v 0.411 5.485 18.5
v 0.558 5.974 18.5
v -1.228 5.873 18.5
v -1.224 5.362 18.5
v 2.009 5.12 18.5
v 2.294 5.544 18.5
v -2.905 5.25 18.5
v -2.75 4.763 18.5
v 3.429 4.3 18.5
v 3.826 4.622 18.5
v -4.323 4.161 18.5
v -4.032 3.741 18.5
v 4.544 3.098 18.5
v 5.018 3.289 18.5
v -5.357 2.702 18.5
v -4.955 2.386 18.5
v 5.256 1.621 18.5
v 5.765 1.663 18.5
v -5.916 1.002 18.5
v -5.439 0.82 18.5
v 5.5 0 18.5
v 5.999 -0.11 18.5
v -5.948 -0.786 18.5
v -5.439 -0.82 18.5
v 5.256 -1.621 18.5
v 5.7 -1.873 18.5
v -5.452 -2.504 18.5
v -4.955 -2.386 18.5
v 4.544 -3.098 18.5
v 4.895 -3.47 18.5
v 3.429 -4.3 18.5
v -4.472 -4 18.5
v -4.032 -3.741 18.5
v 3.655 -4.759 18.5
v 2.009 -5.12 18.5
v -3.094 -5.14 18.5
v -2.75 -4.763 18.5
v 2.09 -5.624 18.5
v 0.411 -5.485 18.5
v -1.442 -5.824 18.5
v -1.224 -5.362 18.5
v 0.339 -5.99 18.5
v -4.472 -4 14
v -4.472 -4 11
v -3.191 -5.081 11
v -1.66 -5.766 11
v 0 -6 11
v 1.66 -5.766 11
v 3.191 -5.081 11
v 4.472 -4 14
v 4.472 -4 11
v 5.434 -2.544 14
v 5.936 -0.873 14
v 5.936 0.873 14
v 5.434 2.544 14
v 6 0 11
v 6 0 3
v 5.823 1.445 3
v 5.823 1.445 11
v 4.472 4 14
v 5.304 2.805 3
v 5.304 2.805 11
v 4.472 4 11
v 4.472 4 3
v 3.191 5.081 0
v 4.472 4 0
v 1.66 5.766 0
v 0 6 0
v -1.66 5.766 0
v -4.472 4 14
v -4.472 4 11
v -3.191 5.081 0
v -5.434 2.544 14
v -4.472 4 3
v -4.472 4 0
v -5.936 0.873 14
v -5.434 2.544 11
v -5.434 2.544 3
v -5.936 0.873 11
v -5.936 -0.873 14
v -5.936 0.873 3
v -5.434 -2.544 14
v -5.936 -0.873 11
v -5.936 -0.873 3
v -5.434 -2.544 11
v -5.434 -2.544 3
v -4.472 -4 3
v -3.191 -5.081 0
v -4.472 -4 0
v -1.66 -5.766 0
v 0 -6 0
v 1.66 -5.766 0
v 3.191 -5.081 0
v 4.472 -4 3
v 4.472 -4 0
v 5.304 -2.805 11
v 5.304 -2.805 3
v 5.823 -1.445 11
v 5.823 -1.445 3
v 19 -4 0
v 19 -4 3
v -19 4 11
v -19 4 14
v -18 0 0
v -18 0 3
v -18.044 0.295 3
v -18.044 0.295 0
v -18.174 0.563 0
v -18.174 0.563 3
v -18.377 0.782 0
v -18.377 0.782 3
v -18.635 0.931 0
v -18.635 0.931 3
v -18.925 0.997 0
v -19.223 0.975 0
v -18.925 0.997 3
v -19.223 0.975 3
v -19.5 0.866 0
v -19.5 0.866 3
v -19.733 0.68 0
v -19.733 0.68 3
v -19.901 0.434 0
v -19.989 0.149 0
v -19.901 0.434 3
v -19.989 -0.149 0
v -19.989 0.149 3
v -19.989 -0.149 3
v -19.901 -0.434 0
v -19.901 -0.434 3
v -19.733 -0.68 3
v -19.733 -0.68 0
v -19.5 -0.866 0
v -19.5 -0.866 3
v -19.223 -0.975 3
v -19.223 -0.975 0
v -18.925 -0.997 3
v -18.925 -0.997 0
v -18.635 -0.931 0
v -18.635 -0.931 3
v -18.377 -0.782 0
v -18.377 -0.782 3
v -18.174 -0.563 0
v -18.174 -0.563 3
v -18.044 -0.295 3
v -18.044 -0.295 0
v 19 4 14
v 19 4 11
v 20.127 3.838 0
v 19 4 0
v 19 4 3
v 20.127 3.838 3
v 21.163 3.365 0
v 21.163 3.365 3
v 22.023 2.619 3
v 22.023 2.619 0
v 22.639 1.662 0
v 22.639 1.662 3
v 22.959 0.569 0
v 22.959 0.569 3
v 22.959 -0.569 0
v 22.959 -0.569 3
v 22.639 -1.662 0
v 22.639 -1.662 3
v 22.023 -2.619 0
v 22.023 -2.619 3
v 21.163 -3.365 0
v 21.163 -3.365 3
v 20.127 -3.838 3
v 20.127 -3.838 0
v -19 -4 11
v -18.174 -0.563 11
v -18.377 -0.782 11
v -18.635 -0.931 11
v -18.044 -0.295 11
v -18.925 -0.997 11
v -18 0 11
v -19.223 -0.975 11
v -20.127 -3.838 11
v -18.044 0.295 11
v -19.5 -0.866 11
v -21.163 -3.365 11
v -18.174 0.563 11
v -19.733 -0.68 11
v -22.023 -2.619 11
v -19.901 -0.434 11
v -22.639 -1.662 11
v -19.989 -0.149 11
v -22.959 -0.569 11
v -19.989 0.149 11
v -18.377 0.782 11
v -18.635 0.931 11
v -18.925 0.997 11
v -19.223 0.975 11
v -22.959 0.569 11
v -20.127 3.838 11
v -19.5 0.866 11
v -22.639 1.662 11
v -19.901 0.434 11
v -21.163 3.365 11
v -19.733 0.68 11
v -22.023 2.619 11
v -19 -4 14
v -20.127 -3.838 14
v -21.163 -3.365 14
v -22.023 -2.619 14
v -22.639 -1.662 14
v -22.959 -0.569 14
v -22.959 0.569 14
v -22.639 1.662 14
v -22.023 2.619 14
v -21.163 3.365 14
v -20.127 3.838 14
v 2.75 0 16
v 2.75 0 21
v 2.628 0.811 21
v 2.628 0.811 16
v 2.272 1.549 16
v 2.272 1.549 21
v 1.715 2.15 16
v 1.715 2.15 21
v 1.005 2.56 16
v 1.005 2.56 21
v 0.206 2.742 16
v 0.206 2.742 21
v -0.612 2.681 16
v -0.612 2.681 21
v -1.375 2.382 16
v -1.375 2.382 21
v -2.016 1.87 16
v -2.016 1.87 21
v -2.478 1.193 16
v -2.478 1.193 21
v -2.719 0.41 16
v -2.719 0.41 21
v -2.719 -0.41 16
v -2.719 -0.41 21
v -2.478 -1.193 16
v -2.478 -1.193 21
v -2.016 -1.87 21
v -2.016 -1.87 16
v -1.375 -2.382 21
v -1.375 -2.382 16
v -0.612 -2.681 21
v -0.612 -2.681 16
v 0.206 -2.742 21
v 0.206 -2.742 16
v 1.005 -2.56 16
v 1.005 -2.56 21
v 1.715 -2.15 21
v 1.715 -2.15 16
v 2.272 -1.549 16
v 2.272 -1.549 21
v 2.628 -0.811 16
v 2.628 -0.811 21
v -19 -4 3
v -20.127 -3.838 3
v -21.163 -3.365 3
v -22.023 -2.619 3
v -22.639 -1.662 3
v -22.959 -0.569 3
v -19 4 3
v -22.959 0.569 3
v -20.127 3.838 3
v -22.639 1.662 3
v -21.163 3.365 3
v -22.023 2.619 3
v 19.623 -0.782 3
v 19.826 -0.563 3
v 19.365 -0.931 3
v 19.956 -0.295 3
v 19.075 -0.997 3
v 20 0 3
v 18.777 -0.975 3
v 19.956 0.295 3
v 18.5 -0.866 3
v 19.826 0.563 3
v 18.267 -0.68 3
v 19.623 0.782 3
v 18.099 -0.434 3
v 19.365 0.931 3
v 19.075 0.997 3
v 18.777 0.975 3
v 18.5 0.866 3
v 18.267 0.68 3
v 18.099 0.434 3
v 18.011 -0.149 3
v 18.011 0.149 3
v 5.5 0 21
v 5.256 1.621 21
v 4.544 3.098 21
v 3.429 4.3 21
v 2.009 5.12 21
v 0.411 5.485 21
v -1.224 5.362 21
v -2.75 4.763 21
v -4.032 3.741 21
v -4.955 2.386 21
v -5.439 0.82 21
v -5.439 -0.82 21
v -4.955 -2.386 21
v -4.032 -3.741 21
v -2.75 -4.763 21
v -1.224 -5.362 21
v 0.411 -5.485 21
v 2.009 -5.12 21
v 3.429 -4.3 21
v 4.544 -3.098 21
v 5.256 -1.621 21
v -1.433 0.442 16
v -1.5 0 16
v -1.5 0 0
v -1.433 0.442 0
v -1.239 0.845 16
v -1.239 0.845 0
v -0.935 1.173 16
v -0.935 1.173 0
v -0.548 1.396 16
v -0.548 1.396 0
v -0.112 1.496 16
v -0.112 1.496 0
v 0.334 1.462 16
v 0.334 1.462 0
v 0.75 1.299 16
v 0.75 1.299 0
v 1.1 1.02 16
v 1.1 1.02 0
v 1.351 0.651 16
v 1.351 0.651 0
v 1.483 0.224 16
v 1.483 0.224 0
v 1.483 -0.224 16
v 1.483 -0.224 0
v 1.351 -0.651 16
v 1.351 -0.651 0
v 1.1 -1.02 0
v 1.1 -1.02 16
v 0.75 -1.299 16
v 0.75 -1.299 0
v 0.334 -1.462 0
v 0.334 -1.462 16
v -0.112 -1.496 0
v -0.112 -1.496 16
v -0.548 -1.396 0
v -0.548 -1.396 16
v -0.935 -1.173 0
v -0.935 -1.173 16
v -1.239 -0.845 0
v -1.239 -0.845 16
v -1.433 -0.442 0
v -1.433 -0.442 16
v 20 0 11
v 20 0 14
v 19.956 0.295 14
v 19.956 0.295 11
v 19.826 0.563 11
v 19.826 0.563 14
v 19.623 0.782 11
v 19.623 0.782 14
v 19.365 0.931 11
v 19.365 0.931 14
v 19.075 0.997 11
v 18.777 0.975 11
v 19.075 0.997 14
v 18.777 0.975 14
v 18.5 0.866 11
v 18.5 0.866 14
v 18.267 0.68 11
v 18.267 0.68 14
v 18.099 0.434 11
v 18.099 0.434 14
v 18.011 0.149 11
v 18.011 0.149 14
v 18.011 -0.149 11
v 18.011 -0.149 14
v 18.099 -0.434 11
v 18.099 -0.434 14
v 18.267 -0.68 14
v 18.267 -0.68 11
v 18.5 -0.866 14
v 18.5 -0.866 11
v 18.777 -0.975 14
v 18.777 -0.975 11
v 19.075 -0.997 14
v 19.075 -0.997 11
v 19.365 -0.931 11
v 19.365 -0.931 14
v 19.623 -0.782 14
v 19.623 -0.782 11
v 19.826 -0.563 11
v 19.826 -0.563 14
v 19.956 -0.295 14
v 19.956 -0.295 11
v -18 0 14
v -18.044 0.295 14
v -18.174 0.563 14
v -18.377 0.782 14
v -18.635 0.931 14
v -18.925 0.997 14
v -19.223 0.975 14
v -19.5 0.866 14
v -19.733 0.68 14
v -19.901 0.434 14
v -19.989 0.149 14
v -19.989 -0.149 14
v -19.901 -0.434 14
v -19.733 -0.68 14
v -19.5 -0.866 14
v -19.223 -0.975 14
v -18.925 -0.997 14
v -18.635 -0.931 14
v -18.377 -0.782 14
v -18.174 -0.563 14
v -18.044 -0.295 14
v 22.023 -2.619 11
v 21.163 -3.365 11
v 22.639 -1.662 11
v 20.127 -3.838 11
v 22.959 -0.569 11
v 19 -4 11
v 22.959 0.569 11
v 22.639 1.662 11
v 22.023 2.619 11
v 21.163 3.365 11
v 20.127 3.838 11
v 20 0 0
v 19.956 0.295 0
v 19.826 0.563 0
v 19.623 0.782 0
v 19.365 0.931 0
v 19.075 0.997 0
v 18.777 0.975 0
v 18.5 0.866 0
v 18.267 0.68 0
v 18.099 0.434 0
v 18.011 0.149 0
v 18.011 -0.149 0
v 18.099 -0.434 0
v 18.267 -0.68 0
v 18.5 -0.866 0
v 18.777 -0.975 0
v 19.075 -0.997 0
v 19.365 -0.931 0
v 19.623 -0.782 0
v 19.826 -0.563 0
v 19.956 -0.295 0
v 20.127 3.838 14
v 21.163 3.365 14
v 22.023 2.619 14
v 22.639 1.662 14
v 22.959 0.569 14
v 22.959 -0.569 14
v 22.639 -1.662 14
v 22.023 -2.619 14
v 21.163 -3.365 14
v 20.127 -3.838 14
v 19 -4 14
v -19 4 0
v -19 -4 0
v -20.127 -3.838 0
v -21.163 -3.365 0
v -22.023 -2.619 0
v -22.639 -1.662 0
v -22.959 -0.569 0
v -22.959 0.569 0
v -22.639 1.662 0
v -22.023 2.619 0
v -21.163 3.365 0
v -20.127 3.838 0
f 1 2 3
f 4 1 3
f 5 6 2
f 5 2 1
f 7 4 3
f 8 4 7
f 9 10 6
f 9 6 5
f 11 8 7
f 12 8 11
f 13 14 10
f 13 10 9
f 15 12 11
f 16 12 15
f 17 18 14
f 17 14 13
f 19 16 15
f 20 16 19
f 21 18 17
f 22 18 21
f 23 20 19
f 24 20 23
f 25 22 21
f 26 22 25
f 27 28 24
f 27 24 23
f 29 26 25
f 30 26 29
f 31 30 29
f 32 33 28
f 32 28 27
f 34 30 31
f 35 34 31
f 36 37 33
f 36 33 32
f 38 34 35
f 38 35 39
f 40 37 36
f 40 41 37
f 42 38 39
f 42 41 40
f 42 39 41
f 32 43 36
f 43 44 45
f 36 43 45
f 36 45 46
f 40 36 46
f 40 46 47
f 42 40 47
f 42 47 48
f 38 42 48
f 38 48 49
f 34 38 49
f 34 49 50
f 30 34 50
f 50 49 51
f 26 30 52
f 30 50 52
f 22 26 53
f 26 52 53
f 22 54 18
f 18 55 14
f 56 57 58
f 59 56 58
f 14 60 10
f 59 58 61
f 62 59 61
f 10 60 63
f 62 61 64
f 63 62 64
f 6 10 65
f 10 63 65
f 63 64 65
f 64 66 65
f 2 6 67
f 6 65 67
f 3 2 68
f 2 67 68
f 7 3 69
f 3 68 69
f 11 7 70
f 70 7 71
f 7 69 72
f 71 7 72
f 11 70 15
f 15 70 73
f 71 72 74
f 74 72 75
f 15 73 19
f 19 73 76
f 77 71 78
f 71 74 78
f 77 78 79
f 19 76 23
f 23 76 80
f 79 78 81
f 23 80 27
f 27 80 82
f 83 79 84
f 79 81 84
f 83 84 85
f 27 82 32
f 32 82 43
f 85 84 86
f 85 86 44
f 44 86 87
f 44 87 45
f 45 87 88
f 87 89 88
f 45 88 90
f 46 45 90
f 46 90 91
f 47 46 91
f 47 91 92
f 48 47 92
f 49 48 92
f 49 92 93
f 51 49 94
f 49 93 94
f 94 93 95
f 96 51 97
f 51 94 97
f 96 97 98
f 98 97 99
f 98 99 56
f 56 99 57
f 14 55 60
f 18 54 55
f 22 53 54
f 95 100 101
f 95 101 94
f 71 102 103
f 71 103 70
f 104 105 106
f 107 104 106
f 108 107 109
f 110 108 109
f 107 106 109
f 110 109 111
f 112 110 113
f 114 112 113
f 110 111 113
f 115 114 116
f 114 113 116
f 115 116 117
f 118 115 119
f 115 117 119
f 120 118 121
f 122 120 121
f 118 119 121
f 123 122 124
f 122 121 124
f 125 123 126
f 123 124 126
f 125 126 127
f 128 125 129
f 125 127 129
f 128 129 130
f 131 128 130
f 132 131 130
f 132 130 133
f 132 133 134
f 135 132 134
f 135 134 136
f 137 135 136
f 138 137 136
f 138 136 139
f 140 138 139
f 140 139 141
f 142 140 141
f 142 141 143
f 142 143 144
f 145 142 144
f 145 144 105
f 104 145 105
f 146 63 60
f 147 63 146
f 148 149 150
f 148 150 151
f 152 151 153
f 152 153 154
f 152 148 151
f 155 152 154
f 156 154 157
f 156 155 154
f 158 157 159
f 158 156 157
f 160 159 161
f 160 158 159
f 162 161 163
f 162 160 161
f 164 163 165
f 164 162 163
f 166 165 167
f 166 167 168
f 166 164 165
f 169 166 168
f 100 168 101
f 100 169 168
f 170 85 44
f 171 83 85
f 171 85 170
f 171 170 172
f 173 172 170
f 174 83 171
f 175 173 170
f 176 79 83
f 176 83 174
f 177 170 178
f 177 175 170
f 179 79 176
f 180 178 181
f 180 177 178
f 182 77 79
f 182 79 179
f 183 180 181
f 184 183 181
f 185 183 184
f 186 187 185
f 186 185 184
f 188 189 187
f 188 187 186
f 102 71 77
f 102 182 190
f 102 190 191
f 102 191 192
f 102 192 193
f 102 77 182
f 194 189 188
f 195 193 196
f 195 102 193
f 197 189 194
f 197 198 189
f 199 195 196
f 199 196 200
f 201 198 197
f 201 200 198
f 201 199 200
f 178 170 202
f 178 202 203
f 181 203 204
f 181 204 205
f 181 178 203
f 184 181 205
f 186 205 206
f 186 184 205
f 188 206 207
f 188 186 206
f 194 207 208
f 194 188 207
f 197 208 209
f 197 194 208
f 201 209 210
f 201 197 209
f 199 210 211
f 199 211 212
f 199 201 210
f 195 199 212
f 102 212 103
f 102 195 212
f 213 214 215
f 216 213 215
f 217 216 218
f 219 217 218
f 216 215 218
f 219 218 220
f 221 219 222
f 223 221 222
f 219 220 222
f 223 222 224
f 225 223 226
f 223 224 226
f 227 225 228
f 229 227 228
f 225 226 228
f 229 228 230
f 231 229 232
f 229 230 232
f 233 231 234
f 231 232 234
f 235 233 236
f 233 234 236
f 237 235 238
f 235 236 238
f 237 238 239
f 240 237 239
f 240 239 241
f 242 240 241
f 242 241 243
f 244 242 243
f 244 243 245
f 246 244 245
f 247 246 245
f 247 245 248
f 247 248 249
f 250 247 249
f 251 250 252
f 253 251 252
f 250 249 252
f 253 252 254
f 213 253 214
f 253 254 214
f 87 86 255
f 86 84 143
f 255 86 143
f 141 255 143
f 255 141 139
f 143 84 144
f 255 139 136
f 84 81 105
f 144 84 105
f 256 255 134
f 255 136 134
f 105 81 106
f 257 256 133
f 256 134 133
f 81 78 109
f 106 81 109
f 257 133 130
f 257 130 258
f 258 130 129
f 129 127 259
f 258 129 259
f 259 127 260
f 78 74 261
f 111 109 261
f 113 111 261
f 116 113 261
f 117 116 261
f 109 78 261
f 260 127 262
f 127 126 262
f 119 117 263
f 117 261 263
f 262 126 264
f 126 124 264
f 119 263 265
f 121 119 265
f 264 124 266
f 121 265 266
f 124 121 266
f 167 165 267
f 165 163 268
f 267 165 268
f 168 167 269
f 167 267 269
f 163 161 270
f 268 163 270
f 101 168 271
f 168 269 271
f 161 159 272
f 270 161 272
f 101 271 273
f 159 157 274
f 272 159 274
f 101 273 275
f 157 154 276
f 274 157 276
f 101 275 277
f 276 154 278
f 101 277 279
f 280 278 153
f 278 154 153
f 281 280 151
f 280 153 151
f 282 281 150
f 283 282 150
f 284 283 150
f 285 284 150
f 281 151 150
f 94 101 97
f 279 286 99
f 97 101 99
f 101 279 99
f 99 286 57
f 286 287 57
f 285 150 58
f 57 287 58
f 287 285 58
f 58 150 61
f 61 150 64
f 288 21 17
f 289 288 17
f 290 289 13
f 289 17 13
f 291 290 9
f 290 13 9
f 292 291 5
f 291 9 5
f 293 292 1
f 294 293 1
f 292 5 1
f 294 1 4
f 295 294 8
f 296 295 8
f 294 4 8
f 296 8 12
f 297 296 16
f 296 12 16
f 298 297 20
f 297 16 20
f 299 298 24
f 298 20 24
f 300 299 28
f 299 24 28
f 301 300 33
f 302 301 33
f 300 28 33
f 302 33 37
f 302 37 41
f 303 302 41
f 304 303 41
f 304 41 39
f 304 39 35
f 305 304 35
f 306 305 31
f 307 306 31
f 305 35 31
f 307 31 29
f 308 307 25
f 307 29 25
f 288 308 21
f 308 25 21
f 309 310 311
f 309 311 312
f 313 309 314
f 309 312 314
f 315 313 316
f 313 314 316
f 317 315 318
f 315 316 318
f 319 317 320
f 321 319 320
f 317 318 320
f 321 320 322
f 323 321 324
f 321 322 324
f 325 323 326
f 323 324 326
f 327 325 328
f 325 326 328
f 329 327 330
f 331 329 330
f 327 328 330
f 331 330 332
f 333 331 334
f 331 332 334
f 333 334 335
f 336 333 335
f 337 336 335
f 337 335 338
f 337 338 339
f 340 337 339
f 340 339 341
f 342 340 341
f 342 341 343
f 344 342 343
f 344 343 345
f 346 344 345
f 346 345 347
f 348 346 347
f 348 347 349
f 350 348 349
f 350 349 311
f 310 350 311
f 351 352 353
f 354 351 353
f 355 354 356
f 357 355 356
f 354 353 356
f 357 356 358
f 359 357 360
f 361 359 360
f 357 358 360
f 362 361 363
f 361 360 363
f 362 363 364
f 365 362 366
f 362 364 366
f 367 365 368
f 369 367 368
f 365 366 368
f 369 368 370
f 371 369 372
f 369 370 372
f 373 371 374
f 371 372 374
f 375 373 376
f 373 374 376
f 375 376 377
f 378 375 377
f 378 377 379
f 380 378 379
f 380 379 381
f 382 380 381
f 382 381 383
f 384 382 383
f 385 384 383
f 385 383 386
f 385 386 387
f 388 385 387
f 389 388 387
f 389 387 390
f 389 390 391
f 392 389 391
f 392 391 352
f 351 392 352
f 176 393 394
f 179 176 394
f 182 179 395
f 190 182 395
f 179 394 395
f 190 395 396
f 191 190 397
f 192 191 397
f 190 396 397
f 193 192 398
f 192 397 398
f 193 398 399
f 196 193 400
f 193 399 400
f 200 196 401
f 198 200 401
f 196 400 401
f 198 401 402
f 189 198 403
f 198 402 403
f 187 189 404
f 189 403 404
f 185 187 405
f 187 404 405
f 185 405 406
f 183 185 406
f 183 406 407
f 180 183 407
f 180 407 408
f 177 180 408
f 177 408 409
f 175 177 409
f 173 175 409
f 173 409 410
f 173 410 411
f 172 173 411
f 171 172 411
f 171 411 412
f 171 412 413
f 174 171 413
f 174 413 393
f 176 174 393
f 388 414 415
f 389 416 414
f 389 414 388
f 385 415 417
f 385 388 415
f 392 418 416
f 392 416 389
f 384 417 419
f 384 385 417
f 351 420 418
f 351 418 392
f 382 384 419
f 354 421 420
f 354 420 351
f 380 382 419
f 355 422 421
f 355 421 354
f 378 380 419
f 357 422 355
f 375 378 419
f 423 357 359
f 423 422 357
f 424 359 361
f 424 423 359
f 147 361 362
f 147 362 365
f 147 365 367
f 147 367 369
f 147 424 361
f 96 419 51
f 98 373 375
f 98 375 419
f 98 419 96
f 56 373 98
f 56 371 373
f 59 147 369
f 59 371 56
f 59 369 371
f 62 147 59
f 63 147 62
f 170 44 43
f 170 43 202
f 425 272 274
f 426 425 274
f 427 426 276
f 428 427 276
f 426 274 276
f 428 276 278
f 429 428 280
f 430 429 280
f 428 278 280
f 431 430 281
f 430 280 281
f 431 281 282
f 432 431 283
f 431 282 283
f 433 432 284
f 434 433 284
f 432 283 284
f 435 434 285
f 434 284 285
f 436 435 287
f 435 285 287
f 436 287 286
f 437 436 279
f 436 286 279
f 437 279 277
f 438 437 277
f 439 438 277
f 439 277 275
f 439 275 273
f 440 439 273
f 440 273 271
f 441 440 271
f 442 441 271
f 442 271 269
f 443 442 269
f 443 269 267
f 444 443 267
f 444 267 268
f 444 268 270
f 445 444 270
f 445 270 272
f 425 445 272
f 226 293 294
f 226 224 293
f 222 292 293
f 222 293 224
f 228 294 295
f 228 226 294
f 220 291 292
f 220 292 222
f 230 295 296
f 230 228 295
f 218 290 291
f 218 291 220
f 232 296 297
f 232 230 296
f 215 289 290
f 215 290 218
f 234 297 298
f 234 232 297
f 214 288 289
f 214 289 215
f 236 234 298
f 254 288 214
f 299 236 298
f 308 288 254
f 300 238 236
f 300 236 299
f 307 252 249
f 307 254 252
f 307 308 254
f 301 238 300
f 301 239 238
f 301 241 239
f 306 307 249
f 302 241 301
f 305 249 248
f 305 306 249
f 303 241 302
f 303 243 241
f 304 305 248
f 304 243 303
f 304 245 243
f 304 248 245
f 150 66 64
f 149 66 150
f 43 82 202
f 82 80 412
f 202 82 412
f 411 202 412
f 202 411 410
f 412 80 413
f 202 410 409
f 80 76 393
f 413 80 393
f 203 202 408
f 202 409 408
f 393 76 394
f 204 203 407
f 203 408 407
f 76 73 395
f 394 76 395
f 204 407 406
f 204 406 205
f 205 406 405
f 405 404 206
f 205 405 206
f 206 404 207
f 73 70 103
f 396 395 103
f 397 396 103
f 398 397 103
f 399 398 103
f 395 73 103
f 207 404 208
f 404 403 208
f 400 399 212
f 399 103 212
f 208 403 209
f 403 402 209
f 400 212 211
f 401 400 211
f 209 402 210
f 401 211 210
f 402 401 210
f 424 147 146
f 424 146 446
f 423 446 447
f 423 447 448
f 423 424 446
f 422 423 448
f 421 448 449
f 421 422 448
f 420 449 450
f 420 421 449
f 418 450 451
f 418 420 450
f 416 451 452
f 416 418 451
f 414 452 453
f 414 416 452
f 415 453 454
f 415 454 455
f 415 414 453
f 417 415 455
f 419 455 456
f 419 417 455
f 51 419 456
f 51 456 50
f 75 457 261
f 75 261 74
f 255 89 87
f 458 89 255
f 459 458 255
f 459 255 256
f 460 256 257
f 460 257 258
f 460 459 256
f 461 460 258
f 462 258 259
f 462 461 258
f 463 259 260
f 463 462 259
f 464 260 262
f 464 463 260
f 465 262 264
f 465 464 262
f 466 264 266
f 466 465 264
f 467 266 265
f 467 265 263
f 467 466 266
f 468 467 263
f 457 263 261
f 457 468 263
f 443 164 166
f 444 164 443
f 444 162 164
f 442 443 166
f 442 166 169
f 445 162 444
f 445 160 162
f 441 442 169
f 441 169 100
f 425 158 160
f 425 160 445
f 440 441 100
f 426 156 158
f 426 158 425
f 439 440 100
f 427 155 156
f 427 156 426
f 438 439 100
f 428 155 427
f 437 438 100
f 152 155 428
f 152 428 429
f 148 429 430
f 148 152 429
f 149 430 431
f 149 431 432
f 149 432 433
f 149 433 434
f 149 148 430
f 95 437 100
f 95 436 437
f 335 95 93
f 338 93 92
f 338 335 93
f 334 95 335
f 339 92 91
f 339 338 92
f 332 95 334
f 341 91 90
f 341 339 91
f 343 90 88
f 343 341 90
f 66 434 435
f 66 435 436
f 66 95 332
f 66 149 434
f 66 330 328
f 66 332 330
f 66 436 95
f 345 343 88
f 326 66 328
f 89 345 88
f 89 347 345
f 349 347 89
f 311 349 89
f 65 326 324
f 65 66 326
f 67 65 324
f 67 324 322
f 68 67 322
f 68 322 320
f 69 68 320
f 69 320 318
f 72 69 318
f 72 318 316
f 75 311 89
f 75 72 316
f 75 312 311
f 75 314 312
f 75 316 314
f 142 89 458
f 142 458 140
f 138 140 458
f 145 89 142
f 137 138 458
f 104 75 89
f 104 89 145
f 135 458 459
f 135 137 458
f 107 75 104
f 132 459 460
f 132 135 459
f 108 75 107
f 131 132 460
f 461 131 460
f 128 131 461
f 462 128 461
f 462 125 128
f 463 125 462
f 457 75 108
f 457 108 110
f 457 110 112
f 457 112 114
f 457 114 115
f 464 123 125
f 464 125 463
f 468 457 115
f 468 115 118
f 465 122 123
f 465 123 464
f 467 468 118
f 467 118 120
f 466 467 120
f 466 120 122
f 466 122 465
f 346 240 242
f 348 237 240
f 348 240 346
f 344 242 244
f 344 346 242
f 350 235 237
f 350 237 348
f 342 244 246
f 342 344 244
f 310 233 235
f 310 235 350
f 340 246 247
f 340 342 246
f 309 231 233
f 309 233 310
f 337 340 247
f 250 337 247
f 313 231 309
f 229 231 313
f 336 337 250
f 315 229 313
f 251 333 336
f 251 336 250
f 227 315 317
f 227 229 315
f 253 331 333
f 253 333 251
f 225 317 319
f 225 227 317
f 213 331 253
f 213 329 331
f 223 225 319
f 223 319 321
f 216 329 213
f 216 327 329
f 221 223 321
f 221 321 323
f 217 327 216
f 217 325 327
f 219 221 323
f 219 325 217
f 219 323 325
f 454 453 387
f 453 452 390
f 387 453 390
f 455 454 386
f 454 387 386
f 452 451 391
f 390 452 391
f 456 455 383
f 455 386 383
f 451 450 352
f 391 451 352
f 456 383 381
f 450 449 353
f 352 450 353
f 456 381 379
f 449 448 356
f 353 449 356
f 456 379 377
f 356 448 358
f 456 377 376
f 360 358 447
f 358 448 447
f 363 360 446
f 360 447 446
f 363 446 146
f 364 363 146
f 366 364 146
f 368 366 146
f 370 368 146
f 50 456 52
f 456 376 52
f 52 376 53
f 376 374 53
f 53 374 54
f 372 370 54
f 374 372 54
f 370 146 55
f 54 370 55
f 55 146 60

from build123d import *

# Parameters (mm, degrees)
SKETCH_1_R          = 6
EXTRUDE_1_DEPTH     = 11
EXTRUDE_2_DEPTH     = 3
EXTRUDE_3_DEPTH     = 3
SKETCH_5_R          = 6
EXTRUDE_4_DEPTH     = 10
SKETCH_6_R          = 1.5
CUT_EXTRUDE_1_DEPTH = 32.717503054
CUT_EXTRUDE_START   = -2.5
SKETCH_7_R          = 6
SKETCH_7_R_2        = 5.5
CUT_EXTRUDE_2_DEPTH = 2.5
SKETCH_8_R          = 1
CUT_EXTRUDE_3_DEPTH = 28.586228448
SKETCH_9_R          = 2.75
CUT_EXTRUDE_4_DEPTH = 5


with BuildPart() as part:
    # 草图1 → 凸台-拉伸1 (new body)
    with BuildSketch(Plane.XY):
        Circle(SKETCH_1_R)
    extrude(amount=EXTRUDE_1_DEPTH)

    # 草图2 → 凸台-拉伸2 (add)
    with BuildSketch(Plane.XY):
        with BuildLine():
            Line((-19, 4), (19, 4))
            ThreePointArc((19, 4), (23, 0), (19, -4))
            Line((19, -4), (-19, -4))
            ThreePointArc((-19, -4), (-23, 0), (-19, 4))
        make_face()
    extrude(amount=EXTRUDE_2_DEPTH)

    # 草图3 → 凸台-拉伸3 (add)
    with BuildSketch(Plane.XY.offset(11)):
        with BuildLine():
            Line((-19, 4), (19, 4))
            ThreePointArc((19, 4), (23, 0), (19, -4))
            Line((19, -4), (-19, -4))
            ThreePointArc((-19, -4), (-23, 0), (-19, 4))
        make_face()
    extrude(amount=EXTRUDE_3_DEPTH)

    # 草图5 → 凸台-拉伸4 (add)
    with BuildSketch(Plane.XY.offset(11)):
        with Locations(Location((0, 0, 0), (0, 0, 221.810314896))):
            Circle(SKETCH_5_R)
    extrude(amount=EXTRUDE_4_DEPTH)

    # 草图6 → 切除-拉伸1 (cut, through all)
    with BuildSketch(Plane(origin=(0, 0, 0), x_dir=(-1, 0, 0), z_dir=(0, 0, -1))):
        Circle(SKETCH_6_R)
    extrude(amount=-CUT_EXTRUDE_1_DEPTH, mode=Mode.SUBTRACT)

    # 草图7 → 切除-拉伸2 (cut)
    with BuildSketch(Plane.XY.offset(21).offset(CUT_EXTRUDE_START)):
        with Locations(Location((0, 0, 0), (0, 0, 221.810314896))):
            Circle(SKETCH_7_R)
        Circle(SKETCH_7_R_2, mode=Mode.SUBTRACT)
    extrude(amount=CUT_EXTRUDE_2_DEPTH, mode=Mode.SUBTRACT)

    # 草图8 → 切除-拉伸3 (cut, through all)
    with BuildSketch(Plane.XY.offset(14)):
        with Locations((-19, 0)):
            Circle(SKETCH_8_R)
        with Locations((19, 0)):
            Circle(SKETCH_8_R)
    extrude(amount=-CUT_EXTRUDE_3_DEPTH, mode=Mode.SUBTRACT)

    # 草图9 → 切除-拉伸4 (cut)
    with BuildSketch(Plane.XY.offset(21)):
        Circle(SKETCH_9_R)
    extrude(amount=-CUT_EXTRUDE_4_DEPTH, mode=Mode.SUBTRACT)


solid = part.part
